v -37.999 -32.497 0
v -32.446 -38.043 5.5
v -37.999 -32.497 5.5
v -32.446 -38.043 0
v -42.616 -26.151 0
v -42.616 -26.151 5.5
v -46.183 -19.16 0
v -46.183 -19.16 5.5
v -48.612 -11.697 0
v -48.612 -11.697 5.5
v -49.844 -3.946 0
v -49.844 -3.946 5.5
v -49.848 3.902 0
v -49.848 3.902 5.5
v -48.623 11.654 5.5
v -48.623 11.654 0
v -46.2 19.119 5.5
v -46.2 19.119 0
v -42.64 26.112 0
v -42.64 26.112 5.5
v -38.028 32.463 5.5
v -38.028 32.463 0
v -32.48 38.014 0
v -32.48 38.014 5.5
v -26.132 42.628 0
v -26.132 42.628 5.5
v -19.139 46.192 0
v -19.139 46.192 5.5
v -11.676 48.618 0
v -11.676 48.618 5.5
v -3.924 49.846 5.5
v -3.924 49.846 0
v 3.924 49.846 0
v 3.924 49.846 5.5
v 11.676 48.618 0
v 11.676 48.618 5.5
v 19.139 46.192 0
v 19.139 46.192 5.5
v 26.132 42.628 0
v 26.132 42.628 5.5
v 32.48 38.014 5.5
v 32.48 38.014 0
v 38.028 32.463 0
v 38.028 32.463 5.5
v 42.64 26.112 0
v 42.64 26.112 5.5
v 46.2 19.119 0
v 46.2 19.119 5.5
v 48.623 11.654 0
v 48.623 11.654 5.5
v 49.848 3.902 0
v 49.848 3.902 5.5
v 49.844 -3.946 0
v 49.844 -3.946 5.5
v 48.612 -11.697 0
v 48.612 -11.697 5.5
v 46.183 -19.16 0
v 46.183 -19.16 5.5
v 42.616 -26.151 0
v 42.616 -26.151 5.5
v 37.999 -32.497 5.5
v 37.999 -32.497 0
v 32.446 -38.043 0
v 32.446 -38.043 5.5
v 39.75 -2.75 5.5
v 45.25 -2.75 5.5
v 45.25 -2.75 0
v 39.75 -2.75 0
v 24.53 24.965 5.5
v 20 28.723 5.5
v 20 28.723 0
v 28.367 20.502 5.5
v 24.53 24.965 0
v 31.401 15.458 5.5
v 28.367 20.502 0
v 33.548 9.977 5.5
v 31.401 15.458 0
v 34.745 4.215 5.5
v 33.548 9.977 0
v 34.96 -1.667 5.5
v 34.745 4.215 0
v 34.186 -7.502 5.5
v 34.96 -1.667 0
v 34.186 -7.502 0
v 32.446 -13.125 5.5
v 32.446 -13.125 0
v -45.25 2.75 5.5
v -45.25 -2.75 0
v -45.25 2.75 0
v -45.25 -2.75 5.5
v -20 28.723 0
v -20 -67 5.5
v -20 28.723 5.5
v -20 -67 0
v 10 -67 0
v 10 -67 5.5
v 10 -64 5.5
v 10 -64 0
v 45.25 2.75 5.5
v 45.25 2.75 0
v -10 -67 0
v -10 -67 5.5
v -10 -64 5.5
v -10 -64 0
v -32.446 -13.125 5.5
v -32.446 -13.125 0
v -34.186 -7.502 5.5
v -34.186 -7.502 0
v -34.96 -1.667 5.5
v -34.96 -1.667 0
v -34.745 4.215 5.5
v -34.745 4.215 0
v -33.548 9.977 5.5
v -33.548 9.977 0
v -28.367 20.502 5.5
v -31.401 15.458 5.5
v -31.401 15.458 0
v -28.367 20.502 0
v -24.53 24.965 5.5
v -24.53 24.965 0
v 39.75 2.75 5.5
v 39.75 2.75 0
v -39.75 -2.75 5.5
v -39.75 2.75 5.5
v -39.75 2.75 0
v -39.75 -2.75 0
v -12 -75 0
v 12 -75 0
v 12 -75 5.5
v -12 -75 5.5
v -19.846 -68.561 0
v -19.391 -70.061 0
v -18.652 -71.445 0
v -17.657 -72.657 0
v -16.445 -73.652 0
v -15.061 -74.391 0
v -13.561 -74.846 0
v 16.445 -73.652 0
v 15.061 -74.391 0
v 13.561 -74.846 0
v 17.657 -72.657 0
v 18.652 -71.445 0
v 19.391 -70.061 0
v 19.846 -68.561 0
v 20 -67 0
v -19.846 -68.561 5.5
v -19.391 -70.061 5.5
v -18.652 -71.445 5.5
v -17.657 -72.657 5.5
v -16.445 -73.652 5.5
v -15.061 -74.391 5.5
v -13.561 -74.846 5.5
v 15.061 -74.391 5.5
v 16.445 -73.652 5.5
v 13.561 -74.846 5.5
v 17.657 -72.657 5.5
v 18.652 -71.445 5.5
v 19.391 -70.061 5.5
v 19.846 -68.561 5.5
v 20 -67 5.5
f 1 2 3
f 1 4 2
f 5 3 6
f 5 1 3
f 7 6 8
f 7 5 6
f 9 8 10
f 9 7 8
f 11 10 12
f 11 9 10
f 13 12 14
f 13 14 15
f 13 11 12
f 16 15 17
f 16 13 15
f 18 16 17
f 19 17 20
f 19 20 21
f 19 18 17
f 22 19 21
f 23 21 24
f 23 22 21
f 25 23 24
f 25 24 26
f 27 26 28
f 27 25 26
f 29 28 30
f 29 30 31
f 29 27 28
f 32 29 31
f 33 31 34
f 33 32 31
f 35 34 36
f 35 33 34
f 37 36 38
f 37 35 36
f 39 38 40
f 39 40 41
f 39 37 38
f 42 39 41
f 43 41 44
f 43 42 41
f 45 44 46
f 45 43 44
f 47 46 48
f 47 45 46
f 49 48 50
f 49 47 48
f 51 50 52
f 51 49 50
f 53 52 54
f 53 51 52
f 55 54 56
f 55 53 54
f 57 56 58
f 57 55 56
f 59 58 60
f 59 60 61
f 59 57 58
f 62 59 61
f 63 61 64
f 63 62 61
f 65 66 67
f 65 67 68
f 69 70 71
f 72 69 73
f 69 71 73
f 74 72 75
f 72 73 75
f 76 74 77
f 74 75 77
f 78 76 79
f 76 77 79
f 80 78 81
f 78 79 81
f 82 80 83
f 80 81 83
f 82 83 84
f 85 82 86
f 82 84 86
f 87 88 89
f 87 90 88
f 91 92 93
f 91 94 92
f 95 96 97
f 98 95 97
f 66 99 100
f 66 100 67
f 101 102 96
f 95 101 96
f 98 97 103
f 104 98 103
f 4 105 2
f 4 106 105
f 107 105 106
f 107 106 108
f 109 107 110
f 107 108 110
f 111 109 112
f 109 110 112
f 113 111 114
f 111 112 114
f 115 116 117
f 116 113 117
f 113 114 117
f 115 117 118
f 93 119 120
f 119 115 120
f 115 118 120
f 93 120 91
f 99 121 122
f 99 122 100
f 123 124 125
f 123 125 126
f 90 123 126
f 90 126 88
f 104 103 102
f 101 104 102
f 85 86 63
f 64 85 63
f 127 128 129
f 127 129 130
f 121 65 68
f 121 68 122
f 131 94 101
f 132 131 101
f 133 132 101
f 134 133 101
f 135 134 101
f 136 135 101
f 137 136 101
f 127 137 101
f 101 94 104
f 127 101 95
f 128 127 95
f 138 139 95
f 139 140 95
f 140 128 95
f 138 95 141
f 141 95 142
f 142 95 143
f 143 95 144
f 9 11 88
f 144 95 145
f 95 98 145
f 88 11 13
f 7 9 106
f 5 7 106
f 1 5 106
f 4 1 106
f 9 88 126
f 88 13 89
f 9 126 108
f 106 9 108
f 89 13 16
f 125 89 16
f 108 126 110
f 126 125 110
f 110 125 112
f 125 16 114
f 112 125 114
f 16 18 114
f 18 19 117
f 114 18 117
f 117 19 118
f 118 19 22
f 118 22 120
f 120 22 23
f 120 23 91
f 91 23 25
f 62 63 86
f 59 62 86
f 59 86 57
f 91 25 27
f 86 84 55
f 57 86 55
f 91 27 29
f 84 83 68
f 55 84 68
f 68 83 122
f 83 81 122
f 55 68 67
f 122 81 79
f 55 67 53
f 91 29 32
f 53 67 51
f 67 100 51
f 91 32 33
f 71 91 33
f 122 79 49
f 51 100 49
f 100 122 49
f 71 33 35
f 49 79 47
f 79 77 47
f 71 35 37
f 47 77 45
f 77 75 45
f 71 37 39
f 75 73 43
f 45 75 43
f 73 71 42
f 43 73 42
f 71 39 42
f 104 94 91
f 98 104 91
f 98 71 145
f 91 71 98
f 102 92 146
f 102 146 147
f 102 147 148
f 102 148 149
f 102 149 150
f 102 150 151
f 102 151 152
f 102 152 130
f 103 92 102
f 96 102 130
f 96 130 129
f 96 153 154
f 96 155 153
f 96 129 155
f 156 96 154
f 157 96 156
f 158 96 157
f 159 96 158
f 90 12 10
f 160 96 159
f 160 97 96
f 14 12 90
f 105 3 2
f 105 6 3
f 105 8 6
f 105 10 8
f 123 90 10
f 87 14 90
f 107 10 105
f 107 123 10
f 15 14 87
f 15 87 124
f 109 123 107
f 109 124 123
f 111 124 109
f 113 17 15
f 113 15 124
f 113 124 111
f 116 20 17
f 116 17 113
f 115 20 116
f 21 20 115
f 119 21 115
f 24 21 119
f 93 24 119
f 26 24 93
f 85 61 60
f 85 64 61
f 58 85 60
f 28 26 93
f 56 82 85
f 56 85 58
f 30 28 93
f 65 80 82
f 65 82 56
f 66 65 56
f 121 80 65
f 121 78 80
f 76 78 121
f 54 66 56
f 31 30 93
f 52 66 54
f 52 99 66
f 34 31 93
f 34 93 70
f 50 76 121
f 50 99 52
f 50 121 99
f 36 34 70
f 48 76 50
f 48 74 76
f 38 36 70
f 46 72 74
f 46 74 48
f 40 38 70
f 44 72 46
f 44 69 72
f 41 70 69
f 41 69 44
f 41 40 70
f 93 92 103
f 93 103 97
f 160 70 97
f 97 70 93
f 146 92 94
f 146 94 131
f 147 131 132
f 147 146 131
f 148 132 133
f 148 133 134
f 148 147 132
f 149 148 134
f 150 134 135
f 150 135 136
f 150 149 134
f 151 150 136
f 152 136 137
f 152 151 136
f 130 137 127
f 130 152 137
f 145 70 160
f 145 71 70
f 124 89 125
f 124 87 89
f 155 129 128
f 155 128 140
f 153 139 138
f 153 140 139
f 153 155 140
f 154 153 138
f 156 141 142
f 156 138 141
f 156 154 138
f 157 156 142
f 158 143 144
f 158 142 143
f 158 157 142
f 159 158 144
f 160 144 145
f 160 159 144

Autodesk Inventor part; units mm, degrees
ref_plane "YZ Plane" through (0, 0, 0) normal (1, 0, 0) x (0, 1, 0)
ref_plane "XZ Plane" through (0, 0, 0) normal (0, 1, 0) x (-1, 0, 0)
ref_plane "XY Plane" through (0, 0, 0) normal (0, 0, 1) x (1, 0, 0)
sketch "Sketch1" plane through (0, 0, 0) normal (0, 0, 1) x (1, 0, 0)
  circle A0 centre (0, 0) radius 50
  circle A1 centre (0, 0) radius 35
  line L0 (-20, 45) -> (20, 45)
  line L1 (20, 45) -> (20, -75)
  line L2 (20, -75) -> (-20, -75)
  line L3 (-20, -75) -> (-20, 45)
  line L4 (-32.4459, -13.125) -> (-32.4459, -38.0429)
  line L5 (32.4459, -13.125) -> (32.4459, -38.0429)
  line L6 (-10, -67) -> (10, -67)
  line L7 (10, -67) -> (10, -64)
  line L8 (10, -64) -> (-10, -64)
  line L9 (-10, -64) -> (-10, -67)
  dimension "d0" = 100
  dimension "d1" = 70
  dimension "d4" = 40
  dimension "d5" = 120
  dimension "d9" = 20
  dimension "d10" = 3
extrude "Extrusion2" add sketch "Sketch1" along normal blind 5.5 contours A0 L5 A1 L1 L0 L3 L4 | L3 A1 L1 A0 | A0 L1 L2 L3 | L3 A1 L1 | L3 L0 L1 A1 | L9 L8 L7 L6
fillet "Fillet1" radius 8 2 edges at (20, -75, 2.75) (-20, -75, 2.75)
sketch "Sketch2" plane through (0, 0, 5.5) normal (0, 0, 1) x (1, 0, 0)
  line L0 (-10, -67) -> (10, -67)
  line L1 (10, -67) -> (10, -64)
  line L2 (10, -64) -> (-10, -64)
  line L3 (-10, -64) -> (-10, -67)
  point P0 (0, 0)
  dimension "d11" = 20
  dimension "d12" = 3
extrude "Extrusion3" cut sketch "Sketch2" against normal blind 5.5
sketch "Sketch4" plane through (0, 0, 5.5) normal (0, 0, 1) x (1, 0, 0)
  line L0 (39.75, 2.75) -> (45.25, 2.75)
  line L1 (45.25, 2.75) -> (45.25, -2.75)
  line L2 (45.25, -2.75) -> (39.75, -2.75)
  line L3 (39.75, -2.75) -> (39.75, 2.75)
  line L4 (-39.75, -2.75) -> (-45.25, -2.75)
  line L5 (-45.25, -2.75) -> (-45.25, 2.75)
  line L6 (-45.25, 2.75) -> (-39.75, 2.75)
  line L7 (-39.75, 2.75) -> (-39.75, -2.75)
  point P0 (0, 0)
  point P1 (0, 0)
  dimension "d24" = 5.5
  dimension "d25" = 5.5
  dimension "d26" = 360
extrude "Extrusion5" cut sketch "Sketch4" against normal blind 10
properties part number "central"
